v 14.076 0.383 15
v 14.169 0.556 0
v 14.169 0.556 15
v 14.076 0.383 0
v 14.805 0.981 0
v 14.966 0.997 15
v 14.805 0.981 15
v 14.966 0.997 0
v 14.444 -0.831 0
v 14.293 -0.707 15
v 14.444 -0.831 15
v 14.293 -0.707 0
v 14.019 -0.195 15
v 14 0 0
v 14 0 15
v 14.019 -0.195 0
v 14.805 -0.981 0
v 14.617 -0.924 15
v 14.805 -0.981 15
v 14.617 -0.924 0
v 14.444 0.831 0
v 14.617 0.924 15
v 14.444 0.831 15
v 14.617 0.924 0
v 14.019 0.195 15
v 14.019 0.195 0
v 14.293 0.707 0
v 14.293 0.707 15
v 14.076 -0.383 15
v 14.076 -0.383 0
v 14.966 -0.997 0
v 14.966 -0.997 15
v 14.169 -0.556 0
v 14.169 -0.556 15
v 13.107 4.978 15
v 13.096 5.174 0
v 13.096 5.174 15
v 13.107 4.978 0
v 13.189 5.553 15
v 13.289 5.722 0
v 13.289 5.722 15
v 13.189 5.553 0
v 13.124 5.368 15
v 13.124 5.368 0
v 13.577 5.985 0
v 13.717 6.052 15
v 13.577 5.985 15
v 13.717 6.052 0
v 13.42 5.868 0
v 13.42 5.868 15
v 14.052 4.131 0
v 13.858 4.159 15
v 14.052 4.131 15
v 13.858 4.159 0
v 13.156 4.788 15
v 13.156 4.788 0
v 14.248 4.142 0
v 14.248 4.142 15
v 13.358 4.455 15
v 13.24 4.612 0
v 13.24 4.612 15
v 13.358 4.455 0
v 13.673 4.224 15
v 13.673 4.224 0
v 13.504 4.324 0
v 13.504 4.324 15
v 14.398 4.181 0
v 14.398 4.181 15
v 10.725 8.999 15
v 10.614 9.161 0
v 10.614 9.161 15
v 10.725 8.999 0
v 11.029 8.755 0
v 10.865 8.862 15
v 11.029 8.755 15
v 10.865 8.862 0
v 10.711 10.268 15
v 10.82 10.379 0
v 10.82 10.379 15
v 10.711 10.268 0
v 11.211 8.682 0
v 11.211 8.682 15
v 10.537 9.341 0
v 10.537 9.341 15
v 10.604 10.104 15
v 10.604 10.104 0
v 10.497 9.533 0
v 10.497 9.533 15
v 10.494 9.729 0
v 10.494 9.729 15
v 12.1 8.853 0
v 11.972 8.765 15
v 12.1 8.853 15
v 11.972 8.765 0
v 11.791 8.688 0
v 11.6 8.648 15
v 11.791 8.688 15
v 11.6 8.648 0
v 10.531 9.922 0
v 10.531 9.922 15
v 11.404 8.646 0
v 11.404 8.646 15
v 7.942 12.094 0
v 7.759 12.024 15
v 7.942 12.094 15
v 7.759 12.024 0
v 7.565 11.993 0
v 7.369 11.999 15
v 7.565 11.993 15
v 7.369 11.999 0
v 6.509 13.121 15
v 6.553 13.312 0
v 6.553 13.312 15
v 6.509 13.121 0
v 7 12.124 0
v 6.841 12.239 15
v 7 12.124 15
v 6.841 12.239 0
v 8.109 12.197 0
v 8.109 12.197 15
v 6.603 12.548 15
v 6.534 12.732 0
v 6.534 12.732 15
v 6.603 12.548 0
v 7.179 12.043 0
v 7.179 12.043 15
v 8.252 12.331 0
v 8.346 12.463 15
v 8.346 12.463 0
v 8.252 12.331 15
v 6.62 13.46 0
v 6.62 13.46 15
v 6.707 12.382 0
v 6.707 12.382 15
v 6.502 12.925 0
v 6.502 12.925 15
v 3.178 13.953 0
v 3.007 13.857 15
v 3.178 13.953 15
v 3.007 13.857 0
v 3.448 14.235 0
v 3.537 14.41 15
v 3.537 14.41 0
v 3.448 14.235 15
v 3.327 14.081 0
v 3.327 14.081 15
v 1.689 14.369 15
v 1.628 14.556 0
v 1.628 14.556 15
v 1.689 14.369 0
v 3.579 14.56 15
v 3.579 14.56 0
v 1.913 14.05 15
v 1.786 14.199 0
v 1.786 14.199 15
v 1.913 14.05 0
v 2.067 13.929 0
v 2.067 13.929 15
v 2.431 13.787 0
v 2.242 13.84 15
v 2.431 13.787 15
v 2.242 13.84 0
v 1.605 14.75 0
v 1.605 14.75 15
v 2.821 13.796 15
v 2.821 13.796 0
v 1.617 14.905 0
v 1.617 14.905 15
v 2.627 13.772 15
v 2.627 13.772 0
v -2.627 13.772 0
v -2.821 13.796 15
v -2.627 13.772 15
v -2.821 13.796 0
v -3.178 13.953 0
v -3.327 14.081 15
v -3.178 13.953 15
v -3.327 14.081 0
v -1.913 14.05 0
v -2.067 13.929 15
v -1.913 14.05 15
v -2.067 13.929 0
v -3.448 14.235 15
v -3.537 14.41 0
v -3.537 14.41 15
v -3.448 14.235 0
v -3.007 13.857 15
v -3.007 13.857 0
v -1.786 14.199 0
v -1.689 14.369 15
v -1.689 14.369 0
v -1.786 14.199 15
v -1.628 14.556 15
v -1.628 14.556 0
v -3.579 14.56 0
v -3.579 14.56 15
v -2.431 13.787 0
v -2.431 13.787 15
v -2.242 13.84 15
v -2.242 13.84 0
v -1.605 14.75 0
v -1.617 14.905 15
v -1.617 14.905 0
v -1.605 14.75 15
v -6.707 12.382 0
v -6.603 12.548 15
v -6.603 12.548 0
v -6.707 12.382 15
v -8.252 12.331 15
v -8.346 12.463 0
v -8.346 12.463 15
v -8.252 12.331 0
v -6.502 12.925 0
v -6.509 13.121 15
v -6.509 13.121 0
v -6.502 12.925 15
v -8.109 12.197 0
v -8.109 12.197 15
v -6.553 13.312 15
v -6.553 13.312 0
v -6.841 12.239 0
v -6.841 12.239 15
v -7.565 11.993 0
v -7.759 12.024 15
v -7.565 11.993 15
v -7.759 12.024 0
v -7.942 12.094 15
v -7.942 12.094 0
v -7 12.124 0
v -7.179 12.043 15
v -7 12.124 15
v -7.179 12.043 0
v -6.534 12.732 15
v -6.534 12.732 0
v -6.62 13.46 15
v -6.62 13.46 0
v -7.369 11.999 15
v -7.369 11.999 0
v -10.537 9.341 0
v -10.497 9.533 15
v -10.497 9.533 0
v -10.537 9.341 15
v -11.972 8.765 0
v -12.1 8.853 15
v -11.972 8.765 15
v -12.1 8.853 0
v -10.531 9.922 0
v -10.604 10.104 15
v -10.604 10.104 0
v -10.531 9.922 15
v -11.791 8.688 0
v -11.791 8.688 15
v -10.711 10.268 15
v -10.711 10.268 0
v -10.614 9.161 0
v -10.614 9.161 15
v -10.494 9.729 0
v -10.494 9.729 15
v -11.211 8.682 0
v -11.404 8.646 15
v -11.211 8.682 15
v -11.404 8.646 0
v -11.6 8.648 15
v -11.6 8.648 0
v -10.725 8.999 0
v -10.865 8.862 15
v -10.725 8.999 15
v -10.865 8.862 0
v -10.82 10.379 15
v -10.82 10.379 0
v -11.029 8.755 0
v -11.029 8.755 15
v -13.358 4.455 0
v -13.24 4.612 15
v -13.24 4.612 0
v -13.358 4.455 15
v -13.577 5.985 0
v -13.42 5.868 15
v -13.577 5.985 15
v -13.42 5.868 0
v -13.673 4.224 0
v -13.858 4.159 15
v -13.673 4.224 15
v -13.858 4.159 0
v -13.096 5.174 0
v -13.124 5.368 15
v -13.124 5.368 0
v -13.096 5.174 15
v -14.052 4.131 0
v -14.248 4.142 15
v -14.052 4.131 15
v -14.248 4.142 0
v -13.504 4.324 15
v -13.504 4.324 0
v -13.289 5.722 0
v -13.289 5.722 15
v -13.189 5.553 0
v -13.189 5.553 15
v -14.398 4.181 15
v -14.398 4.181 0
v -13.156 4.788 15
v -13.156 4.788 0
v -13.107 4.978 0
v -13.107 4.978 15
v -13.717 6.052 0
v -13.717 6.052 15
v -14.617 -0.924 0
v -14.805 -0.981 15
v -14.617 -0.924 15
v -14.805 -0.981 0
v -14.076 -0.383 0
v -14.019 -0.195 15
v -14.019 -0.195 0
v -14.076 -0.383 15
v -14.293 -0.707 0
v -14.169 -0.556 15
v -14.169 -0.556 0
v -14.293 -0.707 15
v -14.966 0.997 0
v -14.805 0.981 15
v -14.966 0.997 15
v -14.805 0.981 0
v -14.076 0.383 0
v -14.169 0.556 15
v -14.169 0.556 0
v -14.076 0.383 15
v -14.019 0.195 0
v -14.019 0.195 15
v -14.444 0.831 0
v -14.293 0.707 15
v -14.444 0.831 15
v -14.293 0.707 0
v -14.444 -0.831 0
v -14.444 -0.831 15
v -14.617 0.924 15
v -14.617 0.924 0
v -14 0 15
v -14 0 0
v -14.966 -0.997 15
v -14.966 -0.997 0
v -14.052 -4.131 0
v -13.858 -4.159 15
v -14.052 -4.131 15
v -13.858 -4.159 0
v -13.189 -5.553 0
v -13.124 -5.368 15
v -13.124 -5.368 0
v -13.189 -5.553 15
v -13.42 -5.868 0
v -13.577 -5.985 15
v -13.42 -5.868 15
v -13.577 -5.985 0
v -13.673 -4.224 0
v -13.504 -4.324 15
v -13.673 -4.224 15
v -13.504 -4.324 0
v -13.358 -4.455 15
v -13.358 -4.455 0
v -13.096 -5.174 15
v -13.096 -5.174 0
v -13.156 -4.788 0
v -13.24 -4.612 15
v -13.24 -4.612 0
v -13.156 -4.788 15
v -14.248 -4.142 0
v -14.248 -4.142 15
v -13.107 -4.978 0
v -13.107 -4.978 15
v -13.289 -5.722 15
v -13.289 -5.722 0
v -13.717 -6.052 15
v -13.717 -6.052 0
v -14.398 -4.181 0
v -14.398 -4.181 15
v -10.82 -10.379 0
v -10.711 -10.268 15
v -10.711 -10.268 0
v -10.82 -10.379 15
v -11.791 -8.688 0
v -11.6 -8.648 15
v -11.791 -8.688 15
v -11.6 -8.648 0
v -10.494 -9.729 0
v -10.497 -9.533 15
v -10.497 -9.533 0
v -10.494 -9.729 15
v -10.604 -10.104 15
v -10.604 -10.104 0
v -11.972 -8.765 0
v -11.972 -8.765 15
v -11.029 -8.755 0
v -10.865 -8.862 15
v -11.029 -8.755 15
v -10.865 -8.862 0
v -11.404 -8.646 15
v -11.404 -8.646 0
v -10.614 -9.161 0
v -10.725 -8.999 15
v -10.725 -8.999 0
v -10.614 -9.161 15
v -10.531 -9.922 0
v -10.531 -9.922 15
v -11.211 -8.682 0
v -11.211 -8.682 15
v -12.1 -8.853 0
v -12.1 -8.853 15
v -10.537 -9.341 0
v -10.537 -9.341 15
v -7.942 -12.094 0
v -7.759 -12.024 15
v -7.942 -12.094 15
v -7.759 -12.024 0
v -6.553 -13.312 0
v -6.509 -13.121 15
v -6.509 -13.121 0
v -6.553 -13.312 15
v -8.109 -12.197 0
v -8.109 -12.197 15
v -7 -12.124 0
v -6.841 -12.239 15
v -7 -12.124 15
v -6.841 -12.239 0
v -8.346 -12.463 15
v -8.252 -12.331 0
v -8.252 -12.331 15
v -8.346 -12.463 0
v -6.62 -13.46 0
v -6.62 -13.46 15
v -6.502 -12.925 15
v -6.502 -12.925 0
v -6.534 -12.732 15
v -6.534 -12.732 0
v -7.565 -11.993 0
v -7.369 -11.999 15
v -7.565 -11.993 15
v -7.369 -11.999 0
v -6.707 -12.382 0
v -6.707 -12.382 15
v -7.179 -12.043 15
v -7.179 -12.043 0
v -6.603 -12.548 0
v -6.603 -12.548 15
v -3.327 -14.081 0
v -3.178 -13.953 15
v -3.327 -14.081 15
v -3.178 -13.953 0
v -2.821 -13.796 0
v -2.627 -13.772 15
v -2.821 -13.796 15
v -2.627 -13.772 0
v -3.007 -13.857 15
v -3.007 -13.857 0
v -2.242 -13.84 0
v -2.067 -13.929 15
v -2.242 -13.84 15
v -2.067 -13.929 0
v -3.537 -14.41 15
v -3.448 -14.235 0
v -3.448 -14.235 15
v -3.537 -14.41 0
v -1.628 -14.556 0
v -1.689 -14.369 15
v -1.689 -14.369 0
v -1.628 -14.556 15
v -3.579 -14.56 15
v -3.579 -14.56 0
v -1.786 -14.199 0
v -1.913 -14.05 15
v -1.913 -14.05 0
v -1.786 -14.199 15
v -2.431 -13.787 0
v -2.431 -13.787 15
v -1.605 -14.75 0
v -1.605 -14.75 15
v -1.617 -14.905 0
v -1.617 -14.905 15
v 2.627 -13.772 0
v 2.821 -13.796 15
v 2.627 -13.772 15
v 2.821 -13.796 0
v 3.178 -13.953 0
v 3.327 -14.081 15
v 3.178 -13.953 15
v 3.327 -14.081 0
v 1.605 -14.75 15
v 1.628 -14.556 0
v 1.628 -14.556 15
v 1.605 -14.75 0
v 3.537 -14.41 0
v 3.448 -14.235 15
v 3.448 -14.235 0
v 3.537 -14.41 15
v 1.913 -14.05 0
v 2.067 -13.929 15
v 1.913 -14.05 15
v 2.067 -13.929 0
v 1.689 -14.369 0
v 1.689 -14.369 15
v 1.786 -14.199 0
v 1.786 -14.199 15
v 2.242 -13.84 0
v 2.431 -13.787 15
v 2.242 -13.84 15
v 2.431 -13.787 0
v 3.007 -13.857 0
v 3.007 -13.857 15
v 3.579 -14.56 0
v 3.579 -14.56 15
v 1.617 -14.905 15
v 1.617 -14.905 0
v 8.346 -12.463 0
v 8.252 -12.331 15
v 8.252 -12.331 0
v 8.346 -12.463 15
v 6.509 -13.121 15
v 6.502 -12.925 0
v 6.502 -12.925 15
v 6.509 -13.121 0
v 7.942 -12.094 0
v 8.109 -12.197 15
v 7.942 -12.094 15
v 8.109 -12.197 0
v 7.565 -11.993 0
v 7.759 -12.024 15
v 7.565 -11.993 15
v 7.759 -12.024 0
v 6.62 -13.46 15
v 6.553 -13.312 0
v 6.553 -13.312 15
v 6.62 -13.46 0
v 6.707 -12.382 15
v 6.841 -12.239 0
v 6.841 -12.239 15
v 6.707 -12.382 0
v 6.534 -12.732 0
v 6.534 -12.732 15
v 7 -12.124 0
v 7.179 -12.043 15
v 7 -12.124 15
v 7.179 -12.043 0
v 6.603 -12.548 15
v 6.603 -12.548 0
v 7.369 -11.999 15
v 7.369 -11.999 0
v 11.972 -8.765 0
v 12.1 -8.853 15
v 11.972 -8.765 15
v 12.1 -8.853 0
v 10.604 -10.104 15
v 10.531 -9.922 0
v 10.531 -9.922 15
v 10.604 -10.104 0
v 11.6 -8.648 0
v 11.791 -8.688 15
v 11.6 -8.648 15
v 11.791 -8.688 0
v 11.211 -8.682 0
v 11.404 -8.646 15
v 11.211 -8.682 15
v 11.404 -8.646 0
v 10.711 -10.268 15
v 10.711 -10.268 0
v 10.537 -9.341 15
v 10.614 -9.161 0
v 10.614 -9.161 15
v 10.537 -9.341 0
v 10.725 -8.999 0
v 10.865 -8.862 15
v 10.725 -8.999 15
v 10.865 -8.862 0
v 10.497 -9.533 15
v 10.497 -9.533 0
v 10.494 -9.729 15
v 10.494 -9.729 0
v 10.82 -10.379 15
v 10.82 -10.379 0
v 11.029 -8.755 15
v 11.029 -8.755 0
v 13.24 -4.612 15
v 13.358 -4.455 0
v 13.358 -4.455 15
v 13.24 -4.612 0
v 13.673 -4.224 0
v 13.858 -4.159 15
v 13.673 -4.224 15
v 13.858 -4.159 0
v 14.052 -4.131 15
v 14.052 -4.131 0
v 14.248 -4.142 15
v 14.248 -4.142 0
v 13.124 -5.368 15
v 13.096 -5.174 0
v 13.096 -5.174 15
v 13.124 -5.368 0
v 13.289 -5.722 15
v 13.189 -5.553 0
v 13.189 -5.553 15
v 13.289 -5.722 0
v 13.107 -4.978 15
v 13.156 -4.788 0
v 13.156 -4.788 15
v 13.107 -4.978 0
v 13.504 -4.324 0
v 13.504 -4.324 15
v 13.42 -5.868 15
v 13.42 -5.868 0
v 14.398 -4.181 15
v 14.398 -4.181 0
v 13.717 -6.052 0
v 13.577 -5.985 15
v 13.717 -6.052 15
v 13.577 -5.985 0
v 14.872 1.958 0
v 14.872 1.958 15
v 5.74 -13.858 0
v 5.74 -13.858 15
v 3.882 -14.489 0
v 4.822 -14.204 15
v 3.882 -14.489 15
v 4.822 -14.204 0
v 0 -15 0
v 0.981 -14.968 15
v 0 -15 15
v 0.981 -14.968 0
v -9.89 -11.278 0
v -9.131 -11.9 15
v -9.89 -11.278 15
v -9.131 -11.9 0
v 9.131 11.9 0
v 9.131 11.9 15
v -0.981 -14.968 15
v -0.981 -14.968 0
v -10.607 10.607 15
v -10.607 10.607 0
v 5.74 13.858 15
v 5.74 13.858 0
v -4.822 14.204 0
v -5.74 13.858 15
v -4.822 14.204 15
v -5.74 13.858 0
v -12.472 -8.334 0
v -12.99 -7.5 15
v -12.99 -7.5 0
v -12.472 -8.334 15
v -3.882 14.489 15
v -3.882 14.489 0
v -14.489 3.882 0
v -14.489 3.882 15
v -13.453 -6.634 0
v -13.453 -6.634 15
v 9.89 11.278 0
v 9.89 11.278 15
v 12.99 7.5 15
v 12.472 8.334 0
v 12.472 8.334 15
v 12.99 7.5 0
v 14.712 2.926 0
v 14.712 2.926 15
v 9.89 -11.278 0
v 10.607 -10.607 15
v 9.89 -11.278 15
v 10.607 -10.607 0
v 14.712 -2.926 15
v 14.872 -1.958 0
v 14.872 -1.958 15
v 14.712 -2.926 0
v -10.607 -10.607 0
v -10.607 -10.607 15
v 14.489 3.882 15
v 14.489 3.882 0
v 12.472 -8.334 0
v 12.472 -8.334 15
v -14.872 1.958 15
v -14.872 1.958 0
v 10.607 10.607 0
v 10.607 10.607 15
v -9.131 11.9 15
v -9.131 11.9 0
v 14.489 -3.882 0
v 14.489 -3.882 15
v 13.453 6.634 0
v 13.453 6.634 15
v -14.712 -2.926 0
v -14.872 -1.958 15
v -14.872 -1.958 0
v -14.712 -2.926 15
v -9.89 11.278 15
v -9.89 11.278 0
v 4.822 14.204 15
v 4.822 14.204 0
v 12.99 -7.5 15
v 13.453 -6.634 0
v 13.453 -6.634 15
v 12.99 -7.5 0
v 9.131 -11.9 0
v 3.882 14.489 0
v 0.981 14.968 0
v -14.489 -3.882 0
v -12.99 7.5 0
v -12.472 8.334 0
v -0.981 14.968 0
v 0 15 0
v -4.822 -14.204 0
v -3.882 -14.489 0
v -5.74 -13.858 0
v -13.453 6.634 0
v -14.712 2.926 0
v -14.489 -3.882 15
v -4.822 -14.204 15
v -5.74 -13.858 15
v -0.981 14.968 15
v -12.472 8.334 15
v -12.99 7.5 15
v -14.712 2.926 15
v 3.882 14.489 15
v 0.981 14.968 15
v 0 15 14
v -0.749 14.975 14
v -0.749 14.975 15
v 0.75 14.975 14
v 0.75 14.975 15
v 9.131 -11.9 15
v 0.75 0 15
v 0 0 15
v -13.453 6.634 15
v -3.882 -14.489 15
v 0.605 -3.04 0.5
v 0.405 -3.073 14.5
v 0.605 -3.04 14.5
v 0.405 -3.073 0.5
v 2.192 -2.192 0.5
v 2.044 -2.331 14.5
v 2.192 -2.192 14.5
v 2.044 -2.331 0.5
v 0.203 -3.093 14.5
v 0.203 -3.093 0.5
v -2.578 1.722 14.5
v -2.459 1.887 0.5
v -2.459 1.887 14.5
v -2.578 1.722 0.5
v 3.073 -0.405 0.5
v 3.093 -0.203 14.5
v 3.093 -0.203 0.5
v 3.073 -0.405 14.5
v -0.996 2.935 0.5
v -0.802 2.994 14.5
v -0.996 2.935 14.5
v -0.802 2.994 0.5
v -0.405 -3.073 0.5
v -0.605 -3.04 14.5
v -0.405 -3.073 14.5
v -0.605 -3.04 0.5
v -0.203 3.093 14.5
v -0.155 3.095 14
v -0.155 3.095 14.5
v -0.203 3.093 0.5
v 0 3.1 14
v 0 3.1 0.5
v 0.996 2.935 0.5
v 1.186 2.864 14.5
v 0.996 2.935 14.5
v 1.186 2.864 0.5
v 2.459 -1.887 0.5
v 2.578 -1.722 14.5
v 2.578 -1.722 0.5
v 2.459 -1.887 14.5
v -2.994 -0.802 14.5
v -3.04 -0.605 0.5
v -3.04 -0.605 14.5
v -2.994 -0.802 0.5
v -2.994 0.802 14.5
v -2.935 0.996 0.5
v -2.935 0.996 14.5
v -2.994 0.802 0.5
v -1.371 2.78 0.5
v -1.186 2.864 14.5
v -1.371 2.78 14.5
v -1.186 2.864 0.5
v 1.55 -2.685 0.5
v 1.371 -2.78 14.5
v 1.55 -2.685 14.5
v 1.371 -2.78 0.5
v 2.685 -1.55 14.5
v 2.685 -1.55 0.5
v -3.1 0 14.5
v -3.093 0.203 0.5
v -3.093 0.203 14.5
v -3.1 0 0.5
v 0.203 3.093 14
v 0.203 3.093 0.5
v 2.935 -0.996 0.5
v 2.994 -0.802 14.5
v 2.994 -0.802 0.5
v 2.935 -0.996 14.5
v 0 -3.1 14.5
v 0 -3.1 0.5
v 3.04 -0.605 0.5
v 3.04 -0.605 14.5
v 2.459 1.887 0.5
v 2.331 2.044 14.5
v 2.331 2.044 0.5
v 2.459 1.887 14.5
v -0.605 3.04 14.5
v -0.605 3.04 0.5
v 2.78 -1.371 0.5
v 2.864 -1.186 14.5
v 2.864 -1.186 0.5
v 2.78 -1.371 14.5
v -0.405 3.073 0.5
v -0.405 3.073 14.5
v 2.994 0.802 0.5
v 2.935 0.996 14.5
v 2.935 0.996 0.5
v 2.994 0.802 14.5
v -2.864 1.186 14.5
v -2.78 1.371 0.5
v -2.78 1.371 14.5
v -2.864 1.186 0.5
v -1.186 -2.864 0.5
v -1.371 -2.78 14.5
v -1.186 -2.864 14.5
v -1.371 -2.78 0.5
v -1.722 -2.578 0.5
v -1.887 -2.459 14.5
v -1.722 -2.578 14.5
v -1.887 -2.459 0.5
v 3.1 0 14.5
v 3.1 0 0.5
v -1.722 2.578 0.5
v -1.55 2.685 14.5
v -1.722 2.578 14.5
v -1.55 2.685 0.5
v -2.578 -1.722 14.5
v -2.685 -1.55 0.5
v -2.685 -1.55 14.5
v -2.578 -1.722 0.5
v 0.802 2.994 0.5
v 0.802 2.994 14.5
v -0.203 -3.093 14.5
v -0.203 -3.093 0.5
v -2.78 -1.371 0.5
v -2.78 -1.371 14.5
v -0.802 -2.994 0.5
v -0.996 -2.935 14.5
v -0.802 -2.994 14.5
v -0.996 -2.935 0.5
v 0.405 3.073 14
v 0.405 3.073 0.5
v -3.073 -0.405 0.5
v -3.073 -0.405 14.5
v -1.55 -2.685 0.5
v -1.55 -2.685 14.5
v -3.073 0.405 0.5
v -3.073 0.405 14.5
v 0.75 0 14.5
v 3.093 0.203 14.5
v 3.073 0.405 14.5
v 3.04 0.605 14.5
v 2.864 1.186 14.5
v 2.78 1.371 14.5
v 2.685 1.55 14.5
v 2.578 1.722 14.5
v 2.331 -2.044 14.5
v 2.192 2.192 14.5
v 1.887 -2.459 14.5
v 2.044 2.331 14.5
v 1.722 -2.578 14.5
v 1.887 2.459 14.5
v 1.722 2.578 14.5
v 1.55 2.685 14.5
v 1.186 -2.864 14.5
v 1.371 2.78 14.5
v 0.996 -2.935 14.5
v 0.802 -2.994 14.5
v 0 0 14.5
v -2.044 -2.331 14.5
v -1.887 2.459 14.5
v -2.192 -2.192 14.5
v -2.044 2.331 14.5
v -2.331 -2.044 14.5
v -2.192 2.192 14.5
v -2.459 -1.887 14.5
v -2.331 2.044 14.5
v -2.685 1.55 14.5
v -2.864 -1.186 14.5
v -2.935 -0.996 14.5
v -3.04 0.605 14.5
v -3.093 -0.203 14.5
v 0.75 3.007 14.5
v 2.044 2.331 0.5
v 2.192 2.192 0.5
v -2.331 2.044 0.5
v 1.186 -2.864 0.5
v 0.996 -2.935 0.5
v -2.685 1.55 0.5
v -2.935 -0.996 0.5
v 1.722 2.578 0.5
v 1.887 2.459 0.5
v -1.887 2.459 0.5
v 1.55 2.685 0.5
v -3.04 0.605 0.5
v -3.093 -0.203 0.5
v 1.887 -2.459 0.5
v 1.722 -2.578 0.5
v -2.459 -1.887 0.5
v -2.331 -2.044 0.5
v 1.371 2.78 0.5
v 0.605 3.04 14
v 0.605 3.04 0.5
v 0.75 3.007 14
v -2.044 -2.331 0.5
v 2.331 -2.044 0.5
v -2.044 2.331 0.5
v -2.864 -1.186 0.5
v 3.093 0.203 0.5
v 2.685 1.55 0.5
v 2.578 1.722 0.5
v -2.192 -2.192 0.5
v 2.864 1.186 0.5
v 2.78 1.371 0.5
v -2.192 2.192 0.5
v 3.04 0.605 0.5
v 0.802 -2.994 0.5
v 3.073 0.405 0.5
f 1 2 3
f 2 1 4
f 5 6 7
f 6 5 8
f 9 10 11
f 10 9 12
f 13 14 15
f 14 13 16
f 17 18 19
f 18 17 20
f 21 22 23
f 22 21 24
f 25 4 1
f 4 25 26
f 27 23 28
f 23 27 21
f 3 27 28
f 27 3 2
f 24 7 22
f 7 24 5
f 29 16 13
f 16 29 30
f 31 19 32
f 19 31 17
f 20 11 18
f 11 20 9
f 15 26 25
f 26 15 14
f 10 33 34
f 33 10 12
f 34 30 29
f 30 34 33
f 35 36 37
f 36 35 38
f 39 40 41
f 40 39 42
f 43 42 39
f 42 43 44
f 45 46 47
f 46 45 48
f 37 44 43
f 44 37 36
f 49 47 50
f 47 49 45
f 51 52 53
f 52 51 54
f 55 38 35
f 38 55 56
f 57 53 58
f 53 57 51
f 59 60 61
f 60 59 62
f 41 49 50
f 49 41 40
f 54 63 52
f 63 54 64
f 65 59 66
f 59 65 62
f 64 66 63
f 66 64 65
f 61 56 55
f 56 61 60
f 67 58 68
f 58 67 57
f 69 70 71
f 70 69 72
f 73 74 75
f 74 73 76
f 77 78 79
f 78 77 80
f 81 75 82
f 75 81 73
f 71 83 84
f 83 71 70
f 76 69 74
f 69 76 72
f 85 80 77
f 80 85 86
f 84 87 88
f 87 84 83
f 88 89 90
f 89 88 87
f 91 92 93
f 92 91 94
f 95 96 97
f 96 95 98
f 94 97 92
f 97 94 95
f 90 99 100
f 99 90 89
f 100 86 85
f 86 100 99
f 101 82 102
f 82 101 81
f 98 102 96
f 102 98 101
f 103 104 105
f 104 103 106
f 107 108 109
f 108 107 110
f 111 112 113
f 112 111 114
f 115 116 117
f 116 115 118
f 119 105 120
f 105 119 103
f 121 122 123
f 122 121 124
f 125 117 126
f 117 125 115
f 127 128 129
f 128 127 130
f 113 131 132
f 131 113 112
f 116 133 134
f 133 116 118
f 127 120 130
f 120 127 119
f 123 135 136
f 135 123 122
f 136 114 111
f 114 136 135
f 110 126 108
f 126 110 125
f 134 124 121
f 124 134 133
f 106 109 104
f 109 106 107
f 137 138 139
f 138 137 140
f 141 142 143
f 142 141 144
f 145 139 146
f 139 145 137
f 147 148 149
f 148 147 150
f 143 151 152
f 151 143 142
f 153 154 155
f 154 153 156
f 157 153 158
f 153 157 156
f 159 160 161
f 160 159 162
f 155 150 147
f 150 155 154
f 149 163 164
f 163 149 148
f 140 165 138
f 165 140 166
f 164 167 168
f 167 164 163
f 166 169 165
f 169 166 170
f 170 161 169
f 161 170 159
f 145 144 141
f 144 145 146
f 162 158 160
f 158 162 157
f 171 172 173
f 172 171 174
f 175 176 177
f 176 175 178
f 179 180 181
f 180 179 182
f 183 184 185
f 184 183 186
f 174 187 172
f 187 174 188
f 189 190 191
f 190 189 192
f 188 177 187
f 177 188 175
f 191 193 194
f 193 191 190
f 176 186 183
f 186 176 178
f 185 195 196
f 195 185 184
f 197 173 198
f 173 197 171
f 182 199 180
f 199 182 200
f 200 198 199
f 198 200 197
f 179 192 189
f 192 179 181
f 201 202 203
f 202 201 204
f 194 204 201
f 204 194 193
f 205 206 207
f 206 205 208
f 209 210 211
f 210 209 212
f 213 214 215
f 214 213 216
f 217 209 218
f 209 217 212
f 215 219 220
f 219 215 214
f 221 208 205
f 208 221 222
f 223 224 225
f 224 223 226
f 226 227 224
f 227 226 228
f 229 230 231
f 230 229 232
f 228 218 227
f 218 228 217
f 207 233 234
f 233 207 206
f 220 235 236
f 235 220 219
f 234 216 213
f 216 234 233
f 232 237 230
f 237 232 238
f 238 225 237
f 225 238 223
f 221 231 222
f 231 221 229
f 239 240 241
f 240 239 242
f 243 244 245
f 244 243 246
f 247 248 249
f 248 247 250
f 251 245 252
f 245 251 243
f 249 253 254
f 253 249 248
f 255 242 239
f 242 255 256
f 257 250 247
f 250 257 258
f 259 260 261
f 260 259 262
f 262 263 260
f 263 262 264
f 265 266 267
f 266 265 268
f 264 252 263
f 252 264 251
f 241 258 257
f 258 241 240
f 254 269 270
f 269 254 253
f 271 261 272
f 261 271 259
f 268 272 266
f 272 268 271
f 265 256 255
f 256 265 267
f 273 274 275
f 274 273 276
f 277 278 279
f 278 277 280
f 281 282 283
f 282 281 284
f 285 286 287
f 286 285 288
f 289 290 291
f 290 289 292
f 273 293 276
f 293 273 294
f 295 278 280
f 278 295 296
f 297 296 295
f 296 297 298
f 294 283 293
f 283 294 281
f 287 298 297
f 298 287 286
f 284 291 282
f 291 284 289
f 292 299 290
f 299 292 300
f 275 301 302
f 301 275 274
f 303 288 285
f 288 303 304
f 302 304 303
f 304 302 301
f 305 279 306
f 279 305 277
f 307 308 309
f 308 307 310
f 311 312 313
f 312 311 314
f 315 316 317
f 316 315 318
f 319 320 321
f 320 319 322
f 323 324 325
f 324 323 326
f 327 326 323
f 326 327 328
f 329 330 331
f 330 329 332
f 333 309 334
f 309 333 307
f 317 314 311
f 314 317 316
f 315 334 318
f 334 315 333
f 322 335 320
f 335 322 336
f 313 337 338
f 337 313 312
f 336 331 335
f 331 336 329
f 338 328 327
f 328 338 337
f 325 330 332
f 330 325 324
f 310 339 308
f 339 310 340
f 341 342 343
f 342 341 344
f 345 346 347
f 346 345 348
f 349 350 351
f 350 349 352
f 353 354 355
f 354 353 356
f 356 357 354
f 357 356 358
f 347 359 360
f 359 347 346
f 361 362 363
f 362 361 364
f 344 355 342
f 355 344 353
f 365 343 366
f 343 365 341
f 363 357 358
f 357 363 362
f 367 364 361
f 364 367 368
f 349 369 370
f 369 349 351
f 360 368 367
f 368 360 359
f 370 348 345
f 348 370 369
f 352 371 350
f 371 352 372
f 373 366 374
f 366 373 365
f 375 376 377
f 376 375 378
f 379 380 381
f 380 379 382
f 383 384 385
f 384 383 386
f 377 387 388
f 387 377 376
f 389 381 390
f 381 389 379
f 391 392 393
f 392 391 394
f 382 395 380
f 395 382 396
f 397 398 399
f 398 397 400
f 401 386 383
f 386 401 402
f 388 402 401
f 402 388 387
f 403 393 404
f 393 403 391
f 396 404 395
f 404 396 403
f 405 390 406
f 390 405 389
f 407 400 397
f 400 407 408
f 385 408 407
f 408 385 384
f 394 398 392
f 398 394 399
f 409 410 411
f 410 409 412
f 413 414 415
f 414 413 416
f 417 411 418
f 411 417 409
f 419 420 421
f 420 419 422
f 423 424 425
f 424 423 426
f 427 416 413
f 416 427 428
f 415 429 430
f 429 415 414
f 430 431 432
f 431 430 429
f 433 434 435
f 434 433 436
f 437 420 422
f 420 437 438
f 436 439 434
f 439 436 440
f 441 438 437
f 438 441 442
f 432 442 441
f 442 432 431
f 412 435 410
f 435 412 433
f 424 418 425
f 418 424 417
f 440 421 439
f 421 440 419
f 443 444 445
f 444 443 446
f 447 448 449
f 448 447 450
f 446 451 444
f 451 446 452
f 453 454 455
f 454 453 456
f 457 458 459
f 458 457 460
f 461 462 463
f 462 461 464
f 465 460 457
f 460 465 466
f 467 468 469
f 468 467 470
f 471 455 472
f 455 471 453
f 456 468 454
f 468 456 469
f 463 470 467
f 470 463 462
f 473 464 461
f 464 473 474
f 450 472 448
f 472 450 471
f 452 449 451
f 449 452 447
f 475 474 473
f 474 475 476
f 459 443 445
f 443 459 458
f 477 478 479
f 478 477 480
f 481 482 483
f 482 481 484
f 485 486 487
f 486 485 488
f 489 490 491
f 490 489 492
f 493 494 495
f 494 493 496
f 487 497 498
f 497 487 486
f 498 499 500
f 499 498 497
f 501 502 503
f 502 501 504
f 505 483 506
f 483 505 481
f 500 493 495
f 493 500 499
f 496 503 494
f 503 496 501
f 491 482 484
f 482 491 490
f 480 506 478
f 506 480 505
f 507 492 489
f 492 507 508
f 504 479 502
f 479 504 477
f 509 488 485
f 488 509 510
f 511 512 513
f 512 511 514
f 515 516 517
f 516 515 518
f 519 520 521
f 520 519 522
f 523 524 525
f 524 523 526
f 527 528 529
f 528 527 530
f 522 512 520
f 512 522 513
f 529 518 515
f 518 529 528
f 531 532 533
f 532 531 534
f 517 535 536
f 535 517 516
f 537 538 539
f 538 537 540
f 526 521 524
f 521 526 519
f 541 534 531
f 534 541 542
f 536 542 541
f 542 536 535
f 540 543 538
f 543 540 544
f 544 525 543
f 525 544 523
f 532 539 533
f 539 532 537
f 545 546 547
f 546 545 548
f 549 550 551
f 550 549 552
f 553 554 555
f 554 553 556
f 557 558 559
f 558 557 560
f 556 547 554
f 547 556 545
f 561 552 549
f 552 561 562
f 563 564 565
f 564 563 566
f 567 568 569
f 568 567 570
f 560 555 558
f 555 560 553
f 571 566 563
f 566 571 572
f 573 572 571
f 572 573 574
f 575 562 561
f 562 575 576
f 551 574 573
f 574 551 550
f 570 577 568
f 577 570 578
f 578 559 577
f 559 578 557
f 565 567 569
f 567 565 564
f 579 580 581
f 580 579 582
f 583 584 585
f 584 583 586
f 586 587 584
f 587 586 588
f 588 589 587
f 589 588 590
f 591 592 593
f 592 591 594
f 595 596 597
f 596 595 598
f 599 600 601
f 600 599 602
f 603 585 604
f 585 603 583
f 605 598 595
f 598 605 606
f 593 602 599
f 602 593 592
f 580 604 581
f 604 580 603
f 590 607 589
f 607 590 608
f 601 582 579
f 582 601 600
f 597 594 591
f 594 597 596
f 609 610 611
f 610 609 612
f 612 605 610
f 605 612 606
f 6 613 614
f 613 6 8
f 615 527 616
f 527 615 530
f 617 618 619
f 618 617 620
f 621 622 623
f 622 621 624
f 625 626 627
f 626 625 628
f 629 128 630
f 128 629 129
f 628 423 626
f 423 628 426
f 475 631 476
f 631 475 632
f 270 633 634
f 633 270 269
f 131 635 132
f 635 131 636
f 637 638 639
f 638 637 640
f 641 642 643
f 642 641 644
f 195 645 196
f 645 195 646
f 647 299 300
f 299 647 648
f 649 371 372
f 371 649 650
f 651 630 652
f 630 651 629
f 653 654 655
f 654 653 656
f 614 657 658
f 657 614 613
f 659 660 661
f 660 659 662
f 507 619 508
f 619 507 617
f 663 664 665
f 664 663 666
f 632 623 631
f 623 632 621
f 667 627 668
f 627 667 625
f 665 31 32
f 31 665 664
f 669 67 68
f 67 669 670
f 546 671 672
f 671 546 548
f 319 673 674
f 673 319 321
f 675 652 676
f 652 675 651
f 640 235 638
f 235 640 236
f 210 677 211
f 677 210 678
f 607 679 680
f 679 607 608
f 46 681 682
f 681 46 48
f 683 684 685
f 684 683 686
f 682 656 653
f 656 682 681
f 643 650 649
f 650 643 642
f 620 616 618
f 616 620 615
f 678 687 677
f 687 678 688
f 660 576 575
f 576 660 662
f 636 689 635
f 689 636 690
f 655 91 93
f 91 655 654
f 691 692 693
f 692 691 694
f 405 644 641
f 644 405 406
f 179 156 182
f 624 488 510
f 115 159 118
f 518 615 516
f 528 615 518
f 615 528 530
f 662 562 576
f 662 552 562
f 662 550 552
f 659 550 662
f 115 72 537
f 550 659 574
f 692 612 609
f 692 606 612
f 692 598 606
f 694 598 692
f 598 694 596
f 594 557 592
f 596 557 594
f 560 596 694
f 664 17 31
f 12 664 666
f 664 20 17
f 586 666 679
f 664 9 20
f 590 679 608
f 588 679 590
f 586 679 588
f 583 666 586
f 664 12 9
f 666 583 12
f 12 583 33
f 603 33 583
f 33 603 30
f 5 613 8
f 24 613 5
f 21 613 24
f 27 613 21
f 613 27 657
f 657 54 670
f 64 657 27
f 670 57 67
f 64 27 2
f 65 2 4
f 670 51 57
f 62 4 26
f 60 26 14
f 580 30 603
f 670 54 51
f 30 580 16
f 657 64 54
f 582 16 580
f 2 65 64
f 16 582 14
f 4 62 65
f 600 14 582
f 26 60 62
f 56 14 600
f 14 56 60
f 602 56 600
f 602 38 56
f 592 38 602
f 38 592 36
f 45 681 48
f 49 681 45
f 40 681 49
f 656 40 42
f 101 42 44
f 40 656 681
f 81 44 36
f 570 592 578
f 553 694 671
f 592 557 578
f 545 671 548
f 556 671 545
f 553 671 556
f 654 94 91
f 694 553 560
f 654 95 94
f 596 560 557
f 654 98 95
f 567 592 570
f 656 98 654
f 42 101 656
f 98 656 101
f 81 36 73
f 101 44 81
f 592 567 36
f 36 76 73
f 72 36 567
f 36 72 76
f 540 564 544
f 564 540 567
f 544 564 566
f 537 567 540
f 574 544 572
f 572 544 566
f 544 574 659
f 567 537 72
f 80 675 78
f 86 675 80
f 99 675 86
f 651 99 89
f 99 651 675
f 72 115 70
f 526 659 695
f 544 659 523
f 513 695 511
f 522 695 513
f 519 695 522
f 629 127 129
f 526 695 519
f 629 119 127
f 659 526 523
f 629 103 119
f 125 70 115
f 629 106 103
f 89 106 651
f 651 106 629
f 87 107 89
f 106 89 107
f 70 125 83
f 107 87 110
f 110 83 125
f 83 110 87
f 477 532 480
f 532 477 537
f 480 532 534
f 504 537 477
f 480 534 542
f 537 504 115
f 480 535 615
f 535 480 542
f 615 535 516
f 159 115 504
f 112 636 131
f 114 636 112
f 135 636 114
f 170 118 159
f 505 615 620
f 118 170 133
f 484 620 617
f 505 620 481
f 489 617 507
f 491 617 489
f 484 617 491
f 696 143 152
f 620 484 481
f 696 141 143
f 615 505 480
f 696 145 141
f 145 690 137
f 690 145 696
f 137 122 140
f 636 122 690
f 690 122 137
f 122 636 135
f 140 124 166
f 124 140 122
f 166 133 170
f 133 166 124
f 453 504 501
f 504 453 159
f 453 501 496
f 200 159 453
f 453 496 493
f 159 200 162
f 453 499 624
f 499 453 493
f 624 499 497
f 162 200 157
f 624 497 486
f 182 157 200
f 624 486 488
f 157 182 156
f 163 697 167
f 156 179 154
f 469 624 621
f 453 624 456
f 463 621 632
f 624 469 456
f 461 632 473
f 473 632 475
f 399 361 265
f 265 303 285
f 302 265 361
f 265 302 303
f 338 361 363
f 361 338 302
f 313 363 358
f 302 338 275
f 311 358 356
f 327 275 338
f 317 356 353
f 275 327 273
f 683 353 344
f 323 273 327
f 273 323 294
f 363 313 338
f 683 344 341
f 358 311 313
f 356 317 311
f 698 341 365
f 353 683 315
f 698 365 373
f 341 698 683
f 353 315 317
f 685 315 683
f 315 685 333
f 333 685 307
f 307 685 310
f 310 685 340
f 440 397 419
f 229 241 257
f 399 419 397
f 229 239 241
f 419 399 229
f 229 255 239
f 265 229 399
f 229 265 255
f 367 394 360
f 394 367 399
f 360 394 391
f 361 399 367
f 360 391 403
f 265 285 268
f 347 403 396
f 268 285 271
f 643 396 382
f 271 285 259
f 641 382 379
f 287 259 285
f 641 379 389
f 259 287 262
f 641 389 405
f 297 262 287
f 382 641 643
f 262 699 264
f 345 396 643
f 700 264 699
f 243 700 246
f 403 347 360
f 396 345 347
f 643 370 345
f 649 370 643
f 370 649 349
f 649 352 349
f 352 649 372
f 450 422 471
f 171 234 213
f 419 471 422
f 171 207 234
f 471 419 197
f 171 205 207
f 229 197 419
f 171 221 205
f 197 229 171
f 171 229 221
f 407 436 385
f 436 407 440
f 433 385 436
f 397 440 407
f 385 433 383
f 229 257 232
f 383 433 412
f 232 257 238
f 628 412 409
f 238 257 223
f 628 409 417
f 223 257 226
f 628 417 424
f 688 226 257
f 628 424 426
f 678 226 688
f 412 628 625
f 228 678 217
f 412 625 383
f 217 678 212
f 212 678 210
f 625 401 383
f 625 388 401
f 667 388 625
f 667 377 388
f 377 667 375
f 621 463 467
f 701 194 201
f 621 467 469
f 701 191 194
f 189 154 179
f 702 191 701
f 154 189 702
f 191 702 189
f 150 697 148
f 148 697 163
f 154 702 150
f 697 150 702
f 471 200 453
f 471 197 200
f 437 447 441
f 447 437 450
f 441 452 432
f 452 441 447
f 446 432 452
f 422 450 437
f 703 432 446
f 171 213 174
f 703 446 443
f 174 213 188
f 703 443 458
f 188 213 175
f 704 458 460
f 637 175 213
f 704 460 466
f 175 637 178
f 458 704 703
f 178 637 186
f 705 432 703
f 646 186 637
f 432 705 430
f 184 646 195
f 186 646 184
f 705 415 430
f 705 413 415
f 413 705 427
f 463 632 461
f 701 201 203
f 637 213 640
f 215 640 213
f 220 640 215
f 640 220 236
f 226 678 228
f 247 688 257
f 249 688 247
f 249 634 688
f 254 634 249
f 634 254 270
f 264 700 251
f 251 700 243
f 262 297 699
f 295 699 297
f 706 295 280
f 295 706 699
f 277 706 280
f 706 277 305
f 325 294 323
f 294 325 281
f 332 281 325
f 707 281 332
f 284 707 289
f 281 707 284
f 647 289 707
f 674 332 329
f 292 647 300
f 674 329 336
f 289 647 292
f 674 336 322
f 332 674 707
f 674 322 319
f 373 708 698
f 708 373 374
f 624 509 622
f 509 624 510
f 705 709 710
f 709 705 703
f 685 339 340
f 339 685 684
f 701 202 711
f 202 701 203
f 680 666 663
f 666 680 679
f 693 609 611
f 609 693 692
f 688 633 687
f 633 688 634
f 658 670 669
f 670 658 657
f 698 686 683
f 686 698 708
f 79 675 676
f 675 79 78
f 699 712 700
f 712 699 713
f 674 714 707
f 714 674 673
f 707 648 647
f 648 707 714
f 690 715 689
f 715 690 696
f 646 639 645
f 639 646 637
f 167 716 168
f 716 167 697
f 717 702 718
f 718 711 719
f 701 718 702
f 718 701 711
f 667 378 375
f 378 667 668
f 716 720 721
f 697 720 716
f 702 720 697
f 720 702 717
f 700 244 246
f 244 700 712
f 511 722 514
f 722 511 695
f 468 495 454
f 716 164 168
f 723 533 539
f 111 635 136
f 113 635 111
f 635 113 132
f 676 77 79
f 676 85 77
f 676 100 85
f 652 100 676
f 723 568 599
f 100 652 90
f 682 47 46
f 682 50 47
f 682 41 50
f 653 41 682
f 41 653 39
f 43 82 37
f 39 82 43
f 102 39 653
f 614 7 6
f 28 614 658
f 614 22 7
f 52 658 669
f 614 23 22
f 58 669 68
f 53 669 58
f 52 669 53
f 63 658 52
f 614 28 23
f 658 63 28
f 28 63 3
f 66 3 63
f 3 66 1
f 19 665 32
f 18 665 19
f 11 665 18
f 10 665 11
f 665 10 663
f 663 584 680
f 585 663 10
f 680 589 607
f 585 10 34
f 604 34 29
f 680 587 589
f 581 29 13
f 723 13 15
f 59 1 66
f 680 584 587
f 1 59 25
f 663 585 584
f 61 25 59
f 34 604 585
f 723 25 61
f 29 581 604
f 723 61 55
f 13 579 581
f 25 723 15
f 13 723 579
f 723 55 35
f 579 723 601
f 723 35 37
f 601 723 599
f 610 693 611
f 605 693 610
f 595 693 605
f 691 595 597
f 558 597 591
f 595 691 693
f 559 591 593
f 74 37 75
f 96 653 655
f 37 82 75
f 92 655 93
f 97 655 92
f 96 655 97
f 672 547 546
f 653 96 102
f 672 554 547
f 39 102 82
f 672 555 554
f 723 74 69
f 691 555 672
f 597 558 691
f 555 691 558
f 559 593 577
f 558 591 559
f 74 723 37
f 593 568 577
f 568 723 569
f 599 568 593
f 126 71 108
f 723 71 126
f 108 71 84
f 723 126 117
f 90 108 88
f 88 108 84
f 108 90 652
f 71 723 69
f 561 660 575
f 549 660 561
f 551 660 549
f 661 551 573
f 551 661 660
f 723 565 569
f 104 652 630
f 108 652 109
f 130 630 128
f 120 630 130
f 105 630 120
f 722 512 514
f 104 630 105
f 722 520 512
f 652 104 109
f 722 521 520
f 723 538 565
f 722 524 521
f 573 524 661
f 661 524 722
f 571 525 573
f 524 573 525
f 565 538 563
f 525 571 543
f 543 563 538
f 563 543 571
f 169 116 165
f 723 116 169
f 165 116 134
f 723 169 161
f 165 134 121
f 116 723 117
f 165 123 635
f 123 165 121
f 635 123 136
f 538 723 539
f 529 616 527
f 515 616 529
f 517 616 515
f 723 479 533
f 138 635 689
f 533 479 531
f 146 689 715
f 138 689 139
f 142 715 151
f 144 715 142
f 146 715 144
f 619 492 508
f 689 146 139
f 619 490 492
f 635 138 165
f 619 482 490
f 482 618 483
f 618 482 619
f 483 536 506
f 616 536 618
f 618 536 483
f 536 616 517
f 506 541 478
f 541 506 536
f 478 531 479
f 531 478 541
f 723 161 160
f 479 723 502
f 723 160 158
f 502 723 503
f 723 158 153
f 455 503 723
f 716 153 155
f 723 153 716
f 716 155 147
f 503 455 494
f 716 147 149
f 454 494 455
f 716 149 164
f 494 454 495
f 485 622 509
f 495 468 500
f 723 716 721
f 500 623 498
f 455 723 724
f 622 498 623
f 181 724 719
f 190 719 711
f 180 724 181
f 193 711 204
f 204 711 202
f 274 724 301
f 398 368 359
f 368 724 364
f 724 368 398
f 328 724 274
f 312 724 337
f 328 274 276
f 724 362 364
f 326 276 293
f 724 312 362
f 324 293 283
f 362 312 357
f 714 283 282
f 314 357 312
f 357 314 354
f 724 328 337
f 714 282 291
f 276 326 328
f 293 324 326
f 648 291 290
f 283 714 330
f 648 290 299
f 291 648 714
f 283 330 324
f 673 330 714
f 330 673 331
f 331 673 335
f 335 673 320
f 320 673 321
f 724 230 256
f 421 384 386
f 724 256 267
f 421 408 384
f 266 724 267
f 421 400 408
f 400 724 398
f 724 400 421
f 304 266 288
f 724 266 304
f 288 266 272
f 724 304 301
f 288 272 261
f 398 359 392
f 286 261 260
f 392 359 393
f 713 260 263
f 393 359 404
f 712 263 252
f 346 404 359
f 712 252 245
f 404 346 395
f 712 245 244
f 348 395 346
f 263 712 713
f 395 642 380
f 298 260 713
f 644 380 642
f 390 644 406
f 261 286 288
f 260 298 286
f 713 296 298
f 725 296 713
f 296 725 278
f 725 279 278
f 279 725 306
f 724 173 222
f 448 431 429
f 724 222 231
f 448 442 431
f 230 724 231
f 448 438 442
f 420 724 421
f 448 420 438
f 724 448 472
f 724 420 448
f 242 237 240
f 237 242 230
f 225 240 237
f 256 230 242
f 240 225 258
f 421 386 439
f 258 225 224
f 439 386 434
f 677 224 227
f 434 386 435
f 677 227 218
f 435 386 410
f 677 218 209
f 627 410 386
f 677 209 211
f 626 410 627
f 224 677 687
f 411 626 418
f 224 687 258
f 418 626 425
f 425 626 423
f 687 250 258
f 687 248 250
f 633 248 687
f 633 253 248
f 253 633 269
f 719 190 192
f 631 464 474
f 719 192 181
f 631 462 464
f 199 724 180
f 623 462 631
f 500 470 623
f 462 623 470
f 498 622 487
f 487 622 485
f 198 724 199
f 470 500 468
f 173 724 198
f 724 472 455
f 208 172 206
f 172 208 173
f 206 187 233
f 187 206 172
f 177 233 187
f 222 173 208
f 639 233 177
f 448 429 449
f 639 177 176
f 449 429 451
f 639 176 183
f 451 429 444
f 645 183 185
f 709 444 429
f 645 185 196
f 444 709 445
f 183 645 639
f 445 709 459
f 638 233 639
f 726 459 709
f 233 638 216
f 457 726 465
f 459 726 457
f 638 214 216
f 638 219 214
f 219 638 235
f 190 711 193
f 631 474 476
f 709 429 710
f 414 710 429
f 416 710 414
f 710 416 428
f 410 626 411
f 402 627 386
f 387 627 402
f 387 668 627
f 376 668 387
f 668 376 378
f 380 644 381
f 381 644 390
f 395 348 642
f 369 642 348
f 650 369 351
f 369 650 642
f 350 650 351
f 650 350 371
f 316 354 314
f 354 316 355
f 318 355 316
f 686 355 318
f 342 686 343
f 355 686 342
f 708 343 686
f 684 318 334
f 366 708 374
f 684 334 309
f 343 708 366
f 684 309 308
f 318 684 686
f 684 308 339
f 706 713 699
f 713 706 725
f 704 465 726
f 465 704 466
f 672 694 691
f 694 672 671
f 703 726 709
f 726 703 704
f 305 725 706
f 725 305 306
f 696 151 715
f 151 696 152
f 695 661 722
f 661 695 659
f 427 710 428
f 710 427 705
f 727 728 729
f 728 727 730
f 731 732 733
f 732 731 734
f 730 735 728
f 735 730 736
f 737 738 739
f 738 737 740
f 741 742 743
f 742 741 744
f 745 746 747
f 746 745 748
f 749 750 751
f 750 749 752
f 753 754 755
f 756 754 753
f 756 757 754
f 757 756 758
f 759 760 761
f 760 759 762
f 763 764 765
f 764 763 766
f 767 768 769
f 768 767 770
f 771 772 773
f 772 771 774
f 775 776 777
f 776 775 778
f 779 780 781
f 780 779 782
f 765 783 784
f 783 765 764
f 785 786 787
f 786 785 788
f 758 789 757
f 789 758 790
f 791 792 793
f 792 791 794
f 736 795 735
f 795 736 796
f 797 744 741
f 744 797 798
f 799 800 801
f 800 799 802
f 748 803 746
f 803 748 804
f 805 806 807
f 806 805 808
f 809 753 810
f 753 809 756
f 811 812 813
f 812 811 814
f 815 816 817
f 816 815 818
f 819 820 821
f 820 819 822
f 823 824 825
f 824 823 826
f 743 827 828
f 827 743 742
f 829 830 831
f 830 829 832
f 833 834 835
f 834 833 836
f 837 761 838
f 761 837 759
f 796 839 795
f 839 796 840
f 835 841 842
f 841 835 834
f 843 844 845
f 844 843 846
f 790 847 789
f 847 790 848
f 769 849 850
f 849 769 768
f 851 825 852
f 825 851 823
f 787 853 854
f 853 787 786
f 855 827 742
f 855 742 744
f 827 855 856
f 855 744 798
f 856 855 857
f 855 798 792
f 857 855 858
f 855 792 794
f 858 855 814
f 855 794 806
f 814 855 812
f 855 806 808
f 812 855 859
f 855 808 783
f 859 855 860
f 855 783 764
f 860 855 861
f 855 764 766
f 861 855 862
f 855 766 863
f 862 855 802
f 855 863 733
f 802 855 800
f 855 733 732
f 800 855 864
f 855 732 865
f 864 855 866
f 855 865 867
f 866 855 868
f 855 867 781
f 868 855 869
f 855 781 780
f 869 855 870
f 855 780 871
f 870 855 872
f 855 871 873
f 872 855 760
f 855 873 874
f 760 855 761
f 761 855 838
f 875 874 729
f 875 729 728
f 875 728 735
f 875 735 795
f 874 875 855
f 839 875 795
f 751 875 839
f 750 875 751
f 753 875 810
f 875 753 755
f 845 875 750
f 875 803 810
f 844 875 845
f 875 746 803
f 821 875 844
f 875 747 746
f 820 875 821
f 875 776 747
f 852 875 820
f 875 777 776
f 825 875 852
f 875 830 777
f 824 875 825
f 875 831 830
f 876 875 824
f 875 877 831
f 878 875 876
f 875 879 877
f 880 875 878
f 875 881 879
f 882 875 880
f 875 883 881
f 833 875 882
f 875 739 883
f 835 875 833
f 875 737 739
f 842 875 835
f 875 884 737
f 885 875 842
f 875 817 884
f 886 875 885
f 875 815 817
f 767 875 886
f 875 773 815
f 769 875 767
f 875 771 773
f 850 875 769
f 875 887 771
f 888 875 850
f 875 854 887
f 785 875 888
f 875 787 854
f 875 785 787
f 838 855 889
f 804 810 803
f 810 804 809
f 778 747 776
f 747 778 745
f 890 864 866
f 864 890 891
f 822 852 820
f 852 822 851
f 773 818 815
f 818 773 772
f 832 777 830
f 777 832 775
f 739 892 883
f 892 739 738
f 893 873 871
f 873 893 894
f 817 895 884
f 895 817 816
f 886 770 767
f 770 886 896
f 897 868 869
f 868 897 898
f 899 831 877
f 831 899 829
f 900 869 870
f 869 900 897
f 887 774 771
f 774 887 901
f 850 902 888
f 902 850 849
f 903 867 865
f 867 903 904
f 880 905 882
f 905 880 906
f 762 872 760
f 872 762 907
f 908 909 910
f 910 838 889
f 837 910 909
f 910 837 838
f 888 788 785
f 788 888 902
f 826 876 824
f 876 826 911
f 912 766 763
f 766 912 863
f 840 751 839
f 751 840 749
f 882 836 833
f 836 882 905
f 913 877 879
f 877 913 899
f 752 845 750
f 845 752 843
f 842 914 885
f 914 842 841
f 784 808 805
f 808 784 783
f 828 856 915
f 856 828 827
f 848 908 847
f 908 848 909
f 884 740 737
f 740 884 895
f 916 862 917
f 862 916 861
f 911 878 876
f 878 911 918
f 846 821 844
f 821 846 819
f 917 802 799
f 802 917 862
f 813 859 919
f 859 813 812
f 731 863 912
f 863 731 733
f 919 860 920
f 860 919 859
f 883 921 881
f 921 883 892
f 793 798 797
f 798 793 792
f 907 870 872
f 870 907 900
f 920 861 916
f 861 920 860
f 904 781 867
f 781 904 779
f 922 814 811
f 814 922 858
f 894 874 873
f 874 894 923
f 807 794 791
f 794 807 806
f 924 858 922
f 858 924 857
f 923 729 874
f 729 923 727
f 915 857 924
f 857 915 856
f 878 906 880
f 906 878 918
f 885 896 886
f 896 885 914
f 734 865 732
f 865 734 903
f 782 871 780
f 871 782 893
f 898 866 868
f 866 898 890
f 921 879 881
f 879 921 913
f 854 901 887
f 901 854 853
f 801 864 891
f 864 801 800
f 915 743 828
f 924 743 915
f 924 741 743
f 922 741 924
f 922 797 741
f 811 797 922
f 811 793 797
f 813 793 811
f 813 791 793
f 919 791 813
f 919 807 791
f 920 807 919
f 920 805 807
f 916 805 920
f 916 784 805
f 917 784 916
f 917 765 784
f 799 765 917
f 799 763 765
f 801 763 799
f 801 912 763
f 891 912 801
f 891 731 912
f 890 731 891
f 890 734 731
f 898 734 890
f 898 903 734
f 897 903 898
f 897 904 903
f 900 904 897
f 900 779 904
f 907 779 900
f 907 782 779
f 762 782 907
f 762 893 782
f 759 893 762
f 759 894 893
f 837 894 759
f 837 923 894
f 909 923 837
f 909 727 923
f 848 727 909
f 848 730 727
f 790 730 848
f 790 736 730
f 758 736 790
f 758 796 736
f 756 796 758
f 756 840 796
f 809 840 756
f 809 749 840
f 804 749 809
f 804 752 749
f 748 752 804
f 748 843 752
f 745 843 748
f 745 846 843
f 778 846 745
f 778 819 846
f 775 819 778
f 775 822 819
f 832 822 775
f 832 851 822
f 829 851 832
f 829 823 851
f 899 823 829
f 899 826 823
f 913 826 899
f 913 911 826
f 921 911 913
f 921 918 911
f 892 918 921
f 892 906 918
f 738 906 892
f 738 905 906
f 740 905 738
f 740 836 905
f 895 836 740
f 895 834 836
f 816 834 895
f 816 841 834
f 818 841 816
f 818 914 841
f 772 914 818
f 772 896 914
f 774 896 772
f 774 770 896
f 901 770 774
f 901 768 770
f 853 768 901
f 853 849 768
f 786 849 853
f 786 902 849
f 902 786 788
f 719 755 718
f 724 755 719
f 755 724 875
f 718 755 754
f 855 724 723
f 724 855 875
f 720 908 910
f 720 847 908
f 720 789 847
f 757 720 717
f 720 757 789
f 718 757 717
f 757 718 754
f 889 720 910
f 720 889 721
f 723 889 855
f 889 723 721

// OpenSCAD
// Replacement knob for a hotplate stirrer with a 6 mm D-shaft
// Print orientation: bottom face (with D-bore) on the bed at z = 0

$fn = 96;

// --- Knob dimensions ---
knob_d      = 30;    // knob outer diameter
knob_h      = 15;    // knob height

// --- D-bore dimensions ---
bore_d      = 6.2;   // bore diameter (circle)
bore_flat   = 4.7;   // distance from flat to opposite side of circle

// --- Groove dimensions ---
groove_d    = 2;     // grip groove diameter (half-cylinder)
groove_n    = 18;    // number of grip grooves
pointer_w   = 1.5;   // pointer groove width
pointer_d   = 1;     // pointer groove depth

// --- Cutting overlap ---
eps         = 0.5;   // extension past faces to avoid coplanar surfaces

difference() {
    // Main body
    cylinder(d = knob_d, h = knob_h);

    // D-shaped blind bore from bottom face
    translate([0, 0, eps])
        linear_extrude(height = knob_h - 2 * eps)
            union() {
                circle(d = bore_d);
                translate([-(bore_d - bore_flat) / 2, 0, 0])
                    cube([bore_d - bore_flat, bore_d, 2 * eps]);
            }

    // Vertical grip grooves along full height
    for (i = [0 : groove_n - 1])
        rotate([0, 0, i * 360 / groove_n])
            translate([knob_d / 2, 0, -eps])
                cylinder(d = groove_d, h = knob_h + 2 * eps, $fn = 32);

    // Pointer groove from centre to outer edge on top face
    translate([0, 0, knob_h - pointer_d])
        linear_extrude(height = pointer_d)
            polygon([
                [0, 0],
                [pointer_w / 2, 0],
                [pointer_w / 2, knob_d / 2],
                [-pointer_w / 2, knob_d / 2]
            ]);
}
